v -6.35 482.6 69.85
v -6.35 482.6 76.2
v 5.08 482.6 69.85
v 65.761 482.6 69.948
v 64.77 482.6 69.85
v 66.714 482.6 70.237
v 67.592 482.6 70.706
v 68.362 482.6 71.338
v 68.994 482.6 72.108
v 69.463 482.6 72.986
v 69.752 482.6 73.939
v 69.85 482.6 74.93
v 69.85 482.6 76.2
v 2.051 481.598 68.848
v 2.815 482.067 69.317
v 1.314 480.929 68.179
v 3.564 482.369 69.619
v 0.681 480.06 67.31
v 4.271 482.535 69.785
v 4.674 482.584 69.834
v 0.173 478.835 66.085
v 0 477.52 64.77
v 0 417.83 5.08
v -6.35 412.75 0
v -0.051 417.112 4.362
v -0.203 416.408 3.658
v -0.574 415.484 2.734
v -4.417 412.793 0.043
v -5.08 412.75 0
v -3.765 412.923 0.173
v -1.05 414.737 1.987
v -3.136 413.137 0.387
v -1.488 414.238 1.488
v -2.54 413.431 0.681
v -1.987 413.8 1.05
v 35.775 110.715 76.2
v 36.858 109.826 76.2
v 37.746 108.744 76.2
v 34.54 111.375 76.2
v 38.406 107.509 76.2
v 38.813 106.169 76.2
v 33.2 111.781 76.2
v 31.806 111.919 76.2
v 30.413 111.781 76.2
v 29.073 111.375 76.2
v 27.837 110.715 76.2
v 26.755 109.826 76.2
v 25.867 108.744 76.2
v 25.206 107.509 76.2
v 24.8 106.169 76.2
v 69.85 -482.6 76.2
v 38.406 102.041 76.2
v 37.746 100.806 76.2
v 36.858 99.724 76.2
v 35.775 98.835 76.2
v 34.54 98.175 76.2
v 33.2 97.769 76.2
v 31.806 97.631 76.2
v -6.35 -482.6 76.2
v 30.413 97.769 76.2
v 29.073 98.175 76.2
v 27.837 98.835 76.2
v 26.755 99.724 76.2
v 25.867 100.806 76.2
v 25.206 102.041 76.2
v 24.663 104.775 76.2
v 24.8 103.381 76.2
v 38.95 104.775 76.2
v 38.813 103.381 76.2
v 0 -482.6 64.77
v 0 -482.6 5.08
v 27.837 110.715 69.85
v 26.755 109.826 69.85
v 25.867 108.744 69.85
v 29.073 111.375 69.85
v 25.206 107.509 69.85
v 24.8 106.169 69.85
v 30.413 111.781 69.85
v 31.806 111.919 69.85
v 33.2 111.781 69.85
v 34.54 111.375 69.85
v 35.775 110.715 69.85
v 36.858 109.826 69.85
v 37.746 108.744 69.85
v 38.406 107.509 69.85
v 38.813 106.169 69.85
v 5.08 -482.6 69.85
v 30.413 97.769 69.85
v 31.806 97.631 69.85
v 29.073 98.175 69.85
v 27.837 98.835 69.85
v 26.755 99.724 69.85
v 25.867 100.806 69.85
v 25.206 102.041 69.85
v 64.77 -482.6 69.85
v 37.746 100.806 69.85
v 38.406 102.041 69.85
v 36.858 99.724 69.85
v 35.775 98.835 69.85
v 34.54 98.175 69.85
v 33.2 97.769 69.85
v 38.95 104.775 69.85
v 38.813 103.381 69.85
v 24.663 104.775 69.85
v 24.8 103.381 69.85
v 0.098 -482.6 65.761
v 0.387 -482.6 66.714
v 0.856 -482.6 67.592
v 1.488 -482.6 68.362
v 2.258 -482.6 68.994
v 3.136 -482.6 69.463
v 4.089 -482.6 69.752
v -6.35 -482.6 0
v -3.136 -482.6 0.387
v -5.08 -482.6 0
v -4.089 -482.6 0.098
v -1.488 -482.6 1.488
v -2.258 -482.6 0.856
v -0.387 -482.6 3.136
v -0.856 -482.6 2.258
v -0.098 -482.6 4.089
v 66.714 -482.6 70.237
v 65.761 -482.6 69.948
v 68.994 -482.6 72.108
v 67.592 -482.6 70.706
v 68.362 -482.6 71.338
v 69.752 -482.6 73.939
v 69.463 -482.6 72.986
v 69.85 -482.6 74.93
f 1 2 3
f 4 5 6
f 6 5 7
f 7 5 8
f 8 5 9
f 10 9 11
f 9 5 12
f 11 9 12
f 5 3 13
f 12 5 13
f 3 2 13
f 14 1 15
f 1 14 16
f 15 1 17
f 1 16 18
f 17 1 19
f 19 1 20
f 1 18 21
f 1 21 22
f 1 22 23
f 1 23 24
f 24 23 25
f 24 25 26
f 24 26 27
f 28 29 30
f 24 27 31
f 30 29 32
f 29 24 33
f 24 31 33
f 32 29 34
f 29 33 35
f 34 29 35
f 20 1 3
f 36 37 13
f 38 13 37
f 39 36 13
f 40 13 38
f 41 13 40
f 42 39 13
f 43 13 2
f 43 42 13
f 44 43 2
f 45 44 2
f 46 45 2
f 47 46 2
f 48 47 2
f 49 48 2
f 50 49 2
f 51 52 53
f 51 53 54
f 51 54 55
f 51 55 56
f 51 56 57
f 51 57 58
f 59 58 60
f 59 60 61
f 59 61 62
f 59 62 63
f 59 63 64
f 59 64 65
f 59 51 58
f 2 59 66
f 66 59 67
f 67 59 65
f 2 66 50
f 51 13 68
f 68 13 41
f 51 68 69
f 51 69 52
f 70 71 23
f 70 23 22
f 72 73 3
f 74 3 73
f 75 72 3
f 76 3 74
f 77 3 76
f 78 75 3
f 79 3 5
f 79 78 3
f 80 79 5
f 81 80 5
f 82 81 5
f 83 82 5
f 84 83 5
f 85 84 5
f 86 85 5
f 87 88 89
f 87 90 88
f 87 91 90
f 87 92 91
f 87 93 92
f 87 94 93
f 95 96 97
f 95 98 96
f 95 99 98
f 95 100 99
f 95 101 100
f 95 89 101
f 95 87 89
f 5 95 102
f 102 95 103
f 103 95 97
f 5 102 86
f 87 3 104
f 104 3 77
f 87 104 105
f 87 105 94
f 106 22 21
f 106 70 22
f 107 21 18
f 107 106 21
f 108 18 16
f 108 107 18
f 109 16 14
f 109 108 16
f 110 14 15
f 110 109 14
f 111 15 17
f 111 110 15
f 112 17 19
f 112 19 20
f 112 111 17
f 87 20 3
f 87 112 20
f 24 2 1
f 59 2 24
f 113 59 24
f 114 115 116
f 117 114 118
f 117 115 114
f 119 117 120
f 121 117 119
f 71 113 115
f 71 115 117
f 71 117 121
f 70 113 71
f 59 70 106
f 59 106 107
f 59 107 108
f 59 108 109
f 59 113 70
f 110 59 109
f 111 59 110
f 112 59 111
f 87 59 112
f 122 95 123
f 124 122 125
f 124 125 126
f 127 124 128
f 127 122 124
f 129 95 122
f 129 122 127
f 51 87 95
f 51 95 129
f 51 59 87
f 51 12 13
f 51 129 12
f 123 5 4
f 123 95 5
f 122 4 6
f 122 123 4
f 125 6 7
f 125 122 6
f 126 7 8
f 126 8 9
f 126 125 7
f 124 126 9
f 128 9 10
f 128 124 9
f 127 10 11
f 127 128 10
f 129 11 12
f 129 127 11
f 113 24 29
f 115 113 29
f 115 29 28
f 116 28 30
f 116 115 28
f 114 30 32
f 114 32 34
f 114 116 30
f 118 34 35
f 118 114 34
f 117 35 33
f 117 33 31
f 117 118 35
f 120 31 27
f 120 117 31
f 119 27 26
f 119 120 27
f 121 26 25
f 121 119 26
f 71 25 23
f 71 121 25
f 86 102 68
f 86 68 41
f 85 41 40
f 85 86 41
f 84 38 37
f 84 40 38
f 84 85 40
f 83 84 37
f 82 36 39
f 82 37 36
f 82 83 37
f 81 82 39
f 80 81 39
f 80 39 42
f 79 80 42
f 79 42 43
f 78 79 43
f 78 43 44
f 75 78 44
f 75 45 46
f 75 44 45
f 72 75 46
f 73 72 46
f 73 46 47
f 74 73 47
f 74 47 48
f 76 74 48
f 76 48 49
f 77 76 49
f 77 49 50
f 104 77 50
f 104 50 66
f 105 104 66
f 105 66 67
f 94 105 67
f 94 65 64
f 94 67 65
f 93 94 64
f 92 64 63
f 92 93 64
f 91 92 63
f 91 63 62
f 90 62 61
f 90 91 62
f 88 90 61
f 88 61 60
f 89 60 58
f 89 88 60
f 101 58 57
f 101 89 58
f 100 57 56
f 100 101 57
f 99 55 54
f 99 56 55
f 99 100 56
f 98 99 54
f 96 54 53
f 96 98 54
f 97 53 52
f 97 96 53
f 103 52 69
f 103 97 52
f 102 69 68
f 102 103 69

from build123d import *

# Parameters (mm, degrees)
F1_DEPTH = 482.6
F3_DEPTH = 6.351
F5_R     = 5.08
F4_R     = 7.14375
F6_DEPTH = 101.6


with BuildPart() as f1:
    # F0 (on Front) → F1 (new body, symmetric)
    with BuildSketch(Plane.XZ):
        Polygon((-6.35, 0), (0, 0), (0, 69.85), (69.85, 69.85), (69.85, 76.2), (-6.35, 76.2), align=None)
    extrude(amount=F1_DEPTH, both=True)

    # F2 (on Right) → F3 (cut, through all)
    with BuildSketch(Plane.YZ):
        Polygon((482.6, 0), (482.6, 69.85), (412.75, 0), align=None)
    extrude(amount=-F3_DEPTH, mode=Mode.SUBTRACT)

    # F5
    f5_edges = [f1.edges().sort_by_distance(p)[0] for p in [
        (0, 0, 69.85),
        (69.85, 0, 69.85),
        (0, -34.925, 0),
    ]]
    fillet(f5_edges, radius=F5_R)

    # F4 (on Top) → F6 (cut)
    with BuildSketch(Plane.XY):
        with Locations((31.806327, 104.775)):
            Circle(F4_R)
    extrude(amount=F6_DEPTH, mode=Mode.SUBTRACT)


solid = f1.part
